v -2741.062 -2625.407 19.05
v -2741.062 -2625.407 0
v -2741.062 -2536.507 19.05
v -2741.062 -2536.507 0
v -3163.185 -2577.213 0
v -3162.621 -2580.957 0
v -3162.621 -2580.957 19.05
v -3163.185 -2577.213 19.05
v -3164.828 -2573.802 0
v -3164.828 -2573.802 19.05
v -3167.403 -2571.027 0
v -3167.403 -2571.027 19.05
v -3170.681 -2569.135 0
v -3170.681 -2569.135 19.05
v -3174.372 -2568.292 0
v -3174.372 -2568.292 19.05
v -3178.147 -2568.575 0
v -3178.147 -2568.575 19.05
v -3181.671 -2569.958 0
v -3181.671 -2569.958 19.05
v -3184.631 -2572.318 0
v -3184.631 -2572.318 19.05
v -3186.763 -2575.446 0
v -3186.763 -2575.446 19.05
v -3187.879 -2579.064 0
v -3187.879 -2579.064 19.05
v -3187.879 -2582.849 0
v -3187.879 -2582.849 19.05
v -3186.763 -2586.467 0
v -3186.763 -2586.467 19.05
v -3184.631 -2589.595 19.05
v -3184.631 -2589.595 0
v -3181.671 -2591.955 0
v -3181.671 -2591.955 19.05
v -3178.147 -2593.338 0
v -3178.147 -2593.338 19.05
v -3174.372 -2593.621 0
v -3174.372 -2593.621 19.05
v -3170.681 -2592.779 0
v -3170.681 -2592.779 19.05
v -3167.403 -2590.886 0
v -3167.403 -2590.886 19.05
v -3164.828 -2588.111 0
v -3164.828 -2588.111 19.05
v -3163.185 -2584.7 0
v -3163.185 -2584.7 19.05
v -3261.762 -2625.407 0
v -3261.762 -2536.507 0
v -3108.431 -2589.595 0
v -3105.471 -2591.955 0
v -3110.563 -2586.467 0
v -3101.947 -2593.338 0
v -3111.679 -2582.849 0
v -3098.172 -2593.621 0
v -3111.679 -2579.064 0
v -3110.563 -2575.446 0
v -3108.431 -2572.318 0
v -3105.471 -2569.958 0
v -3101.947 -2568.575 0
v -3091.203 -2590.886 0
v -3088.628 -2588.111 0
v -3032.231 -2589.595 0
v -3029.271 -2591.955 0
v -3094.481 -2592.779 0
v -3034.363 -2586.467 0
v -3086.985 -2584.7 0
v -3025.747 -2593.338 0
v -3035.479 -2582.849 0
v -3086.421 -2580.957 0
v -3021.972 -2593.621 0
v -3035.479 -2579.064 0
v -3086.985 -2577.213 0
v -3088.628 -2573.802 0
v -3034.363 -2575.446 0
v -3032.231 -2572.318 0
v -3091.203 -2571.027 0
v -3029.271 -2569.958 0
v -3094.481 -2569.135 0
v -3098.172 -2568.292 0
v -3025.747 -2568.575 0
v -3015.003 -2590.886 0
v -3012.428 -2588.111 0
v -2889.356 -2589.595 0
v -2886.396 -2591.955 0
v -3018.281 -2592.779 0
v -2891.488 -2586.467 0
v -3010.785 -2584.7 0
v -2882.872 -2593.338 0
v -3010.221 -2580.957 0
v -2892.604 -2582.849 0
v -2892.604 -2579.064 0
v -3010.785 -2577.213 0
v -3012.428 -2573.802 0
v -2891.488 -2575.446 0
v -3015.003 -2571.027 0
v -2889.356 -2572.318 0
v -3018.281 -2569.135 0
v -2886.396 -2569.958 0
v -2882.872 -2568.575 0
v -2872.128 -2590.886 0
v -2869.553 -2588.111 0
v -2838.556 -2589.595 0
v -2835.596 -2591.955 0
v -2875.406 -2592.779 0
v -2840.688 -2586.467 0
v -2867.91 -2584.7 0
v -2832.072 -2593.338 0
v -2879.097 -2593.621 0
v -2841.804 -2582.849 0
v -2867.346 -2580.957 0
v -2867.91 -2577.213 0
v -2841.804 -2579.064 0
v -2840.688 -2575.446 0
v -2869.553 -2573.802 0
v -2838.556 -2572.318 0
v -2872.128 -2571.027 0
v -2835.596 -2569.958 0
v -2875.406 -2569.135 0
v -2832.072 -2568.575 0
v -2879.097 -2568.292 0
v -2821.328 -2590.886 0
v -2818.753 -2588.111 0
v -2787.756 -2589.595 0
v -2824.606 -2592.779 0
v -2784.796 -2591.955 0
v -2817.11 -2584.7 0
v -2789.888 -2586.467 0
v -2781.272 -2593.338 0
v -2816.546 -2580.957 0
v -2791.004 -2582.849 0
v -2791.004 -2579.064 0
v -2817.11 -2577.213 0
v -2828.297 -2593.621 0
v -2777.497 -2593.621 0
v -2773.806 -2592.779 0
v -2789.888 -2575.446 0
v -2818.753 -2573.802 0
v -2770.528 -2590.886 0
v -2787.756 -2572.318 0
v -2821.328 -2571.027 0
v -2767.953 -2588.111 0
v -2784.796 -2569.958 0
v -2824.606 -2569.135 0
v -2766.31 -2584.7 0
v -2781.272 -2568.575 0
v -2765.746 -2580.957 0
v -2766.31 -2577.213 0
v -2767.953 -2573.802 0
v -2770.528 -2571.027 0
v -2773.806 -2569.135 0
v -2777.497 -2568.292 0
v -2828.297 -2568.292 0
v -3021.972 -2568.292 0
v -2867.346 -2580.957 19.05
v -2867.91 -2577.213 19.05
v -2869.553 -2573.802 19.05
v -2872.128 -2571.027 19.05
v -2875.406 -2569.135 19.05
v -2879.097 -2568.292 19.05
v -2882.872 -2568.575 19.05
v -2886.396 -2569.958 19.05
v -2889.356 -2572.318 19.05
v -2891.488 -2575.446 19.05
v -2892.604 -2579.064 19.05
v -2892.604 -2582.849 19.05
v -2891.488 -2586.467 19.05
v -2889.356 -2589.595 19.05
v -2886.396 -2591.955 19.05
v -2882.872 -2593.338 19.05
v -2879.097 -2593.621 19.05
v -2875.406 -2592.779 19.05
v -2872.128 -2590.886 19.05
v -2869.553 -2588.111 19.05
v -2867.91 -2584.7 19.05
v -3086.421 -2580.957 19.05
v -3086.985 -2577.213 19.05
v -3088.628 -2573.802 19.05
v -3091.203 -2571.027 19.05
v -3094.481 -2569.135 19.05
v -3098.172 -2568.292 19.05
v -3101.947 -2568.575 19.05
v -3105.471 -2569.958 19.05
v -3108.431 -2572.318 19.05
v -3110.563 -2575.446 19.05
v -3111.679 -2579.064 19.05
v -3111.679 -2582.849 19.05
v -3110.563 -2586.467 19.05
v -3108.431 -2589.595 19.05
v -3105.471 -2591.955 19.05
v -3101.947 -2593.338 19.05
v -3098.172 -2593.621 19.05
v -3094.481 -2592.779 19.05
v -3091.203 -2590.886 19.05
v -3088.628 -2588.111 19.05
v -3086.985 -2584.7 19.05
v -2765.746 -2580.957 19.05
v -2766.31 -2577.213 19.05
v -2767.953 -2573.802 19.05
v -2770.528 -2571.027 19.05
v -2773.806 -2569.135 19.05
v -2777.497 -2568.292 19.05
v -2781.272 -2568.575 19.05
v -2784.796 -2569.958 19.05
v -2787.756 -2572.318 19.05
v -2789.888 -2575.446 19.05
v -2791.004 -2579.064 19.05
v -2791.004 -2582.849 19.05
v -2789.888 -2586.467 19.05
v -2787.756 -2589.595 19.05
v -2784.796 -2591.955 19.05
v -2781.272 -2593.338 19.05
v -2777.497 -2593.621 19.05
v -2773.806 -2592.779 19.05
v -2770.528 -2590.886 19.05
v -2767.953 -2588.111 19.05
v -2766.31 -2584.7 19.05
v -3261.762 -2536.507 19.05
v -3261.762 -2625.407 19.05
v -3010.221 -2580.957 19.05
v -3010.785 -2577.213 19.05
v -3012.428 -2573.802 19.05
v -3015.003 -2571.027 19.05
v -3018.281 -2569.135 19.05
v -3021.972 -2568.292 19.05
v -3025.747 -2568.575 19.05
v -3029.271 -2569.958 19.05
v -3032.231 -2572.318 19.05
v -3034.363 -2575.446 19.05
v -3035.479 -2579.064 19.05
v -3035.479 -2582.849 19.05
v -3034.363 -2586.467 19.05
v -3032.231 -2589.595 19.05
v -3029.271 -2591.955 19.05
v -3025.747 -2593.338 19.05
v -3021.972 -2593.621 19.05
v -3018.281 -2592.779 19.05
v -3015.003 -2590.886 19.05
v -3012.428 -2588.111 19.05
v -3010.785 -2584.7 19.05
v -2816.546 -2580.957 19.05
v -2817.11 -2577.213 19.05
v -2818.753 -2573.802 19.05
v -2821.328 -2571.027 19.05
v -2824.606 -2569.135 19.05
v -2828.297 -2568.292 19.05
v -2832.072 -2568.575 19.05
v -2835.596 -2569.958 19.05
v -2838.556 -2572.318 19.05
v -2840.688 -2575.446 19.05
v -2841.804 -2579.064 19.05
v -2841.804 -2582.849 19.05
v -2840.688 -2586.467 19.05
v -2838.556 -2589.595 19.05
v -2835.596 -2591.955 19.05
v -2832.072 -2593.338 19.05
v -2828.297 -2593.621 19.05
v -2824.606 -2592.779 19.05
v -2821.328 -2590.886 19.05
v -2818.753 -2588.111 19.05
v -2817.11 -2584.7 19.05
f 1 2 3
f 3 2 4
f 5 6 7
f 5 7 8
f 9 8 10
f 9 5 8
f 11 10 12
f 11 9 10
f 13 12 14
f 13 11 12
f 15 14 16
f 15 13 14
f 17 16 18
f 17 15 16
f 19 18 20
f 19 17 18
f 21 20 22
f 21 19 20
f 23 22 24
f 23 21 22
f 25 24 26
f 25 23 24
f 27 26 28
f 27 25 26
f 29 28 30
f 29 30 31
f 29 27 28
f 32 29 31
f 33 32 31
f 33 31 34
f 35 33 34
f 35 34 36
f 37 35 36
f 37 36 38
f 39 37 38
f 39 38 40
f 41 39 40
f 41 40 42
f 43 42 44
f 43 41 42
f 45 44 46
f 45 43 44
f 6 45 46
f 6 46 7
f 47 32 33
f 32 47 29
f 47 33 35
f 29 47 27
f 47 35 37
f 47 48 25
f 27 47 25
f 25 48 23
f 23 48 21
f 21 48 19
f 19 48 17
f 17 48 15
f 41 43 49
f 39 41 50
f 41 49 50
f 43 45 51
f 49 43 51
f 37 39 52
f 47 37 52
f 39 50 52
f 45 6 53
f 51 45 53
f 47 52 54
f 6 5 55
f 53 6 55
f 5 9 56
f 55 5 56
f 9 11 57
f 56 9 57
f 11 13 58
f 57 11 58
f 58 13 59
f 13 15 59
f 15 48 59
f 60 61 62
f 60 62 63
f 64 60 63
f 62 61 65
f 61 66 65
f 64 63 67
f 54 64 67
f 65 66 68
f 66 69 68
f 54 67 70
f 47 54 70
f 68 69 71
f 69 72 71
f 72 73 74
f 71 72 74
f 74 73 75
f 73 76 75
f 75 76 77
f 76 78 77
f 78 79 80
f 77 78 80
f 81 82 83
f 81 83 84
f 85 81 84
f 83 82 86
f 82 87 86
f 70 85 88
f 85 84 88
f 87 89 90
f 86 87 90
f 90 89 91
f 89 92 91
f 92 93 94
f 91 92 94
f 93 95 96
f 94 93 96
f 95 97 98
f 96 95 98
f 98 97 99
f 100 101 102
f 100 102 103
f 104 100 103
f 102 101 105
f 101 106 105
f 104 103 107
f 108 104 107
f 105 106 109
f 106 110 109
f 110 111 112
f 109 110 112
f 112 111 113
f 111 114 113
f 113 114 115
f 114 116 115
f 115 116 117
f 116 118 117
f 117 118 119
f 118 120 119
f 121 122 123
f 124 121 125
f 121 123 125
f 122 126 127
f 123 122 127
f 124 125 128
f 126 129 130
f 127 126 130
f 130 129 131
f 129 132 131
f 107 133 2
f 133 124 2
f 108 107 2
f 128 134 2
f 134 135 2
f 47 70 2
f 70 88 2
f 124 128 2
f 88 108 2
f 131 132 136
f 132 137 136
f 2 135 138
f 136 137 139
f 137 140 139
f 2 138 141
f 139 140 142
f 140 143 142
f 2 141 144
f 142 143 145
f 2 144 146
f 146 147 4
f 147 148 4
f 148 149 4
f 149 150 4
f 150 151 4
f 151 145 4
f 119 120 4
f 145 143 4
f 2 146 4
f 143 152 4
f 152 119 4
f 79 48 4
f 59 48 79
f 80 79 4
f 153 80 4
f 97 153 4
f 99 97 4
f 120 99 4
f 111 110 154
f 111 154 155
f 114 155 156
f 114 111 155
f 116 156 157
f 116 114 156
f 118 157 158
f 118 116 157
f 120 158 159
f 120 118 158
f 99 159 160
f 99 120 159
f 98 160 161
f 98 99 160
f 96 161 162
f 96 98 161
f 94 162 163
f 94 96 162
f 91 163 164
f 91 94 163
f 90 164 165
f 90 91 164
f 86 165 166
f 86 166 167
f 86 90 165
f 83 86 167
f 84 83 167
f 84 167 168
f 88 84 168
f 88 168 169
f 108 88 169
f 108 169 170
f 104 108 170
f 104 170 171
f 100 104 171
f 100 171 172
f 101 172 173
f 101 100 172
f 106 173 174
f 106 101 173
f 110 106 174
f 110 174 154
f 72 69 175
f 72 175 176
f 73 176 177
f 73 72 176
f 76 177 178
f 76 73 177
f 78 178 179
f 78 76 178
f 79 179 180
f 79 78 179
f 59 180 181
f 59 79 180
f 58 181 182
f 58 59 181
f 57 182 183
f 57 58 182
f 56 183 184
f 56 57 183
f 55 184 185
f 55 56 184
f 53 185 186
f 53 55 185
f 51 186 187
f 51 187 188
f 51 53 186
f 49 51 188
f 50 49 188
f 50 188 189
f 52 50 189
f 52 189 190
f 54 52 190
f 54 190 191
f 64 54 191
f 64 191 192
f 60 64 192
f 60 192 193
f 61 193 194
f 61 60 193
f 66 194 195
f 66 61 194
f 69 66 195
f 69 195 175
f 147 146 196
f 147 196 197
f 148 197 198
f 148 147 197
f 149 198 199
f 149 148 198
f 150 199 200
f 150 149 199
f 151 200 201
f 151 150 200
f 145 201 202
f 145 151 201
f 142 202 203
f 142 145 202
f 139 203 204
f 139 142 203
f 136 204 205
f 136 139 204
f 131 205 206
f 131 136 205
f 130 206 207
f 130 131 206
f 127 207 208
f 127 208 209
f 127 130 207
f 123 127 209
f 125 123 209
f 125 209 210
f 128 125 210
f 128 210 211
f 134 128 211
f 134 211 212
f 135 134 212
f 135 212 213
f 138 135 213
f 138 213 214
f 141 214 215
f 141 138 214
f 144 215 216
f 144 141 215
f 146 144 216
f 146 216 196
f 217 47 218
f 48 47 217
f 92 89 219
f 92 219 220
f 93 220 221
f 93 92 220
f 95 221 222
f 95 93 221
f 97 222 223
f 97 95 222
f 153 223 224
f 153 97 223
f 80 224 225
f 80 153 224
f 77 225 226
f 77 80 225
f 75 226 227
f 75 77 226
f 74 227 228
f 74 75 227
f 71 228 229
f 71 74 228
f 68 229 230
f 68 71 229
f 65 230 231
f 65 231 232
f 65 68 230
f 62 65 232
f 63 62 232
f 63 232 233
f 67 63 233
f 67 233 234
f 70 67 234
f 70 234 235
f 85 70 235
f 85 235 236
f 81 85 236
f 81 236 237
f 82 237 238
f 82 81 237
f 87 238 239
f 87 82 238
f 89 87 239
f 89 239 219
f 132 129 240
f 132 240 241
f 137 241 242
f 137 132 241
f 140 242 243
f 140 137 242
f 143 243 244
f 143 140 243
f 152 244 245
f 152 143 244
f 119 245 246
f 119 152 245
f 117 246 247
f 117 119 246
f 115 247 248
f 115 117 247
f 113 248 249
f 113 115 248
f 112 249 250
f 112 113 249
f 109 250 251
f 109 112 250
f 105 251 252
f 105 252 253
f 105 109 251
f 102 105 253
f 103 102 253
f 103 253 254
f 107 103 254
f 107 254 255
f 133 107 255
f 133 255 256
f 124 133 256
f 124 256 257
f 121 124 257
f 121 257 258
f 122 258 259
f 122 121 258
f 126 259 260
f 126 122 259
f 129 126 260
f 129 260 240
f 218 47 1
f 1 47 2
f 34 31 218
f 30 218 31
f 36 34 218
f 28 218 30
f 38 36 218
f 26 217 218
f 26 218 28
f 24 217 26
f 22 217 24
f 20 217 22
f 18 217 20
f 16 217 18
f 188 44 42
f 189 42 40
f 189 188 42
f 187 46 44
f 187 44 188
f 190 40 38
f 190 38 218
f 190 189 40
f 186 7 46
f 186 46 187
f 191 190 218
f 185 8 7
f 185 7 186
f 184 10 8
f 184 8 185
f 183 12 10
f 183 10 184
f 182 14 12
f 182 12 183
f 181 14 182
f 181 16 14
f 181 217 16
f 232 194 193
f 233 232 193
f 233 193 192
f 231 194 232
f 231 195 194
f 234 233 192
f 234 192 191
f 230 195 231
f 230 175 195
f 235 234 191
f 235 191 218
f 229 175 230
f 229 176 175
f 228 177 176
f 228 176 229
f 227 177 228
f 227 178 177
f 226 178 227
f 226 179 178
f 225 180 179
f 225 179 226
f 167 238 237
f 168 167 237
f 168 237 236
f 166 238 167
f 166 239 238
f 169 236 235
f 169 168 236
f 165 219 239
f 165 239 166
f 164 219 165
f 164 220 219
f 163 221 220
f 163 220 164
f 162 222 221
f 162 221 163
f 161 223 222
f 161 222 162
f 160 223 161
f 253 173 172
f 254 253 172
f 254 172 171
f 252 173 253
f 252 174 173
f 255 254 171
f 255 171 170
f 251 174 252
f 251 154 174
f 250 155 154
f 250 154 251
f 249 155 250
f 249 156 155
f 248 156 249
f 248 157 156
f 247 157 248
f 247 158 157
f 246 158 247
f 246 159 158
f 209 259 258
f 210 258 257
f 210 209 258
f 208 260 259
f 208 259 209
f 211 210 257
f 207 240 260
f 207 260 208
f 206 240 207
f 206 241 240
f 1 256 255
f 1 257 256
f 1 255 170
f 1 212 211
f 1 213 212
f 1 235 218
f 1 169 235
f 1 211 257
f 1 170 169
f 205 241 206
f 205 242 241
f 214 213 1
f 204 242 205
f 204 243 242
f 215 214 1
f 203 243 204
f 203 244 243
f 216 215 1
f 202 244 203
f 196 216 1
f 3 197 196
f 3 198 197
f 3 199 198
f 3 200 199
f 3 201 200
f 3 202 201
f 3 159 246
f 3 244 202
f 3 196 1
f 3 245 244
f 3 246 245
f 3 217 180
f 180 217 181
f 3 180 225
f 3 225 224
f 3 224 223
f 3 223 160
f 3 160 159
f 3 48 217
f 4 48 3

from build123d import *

# Parameters (mm, degrees)
F0_W     = 520.7
F0_H     = 88.9
F0_R     = 12.7
F1_DEPTH = 19.05


with BuildPart() as f1:
    # F0 (on Top) → F1 (new body)
    with BuildSketch(Plane.XY):
        with Locations((-3001.411803, -2580.956636)):
            Rectangle(F0_W, F0_H)
        with Locations((-3175.321132, -2580.956636)):
            Circle(F0_R, mode=Mode.SUBTRACT)
        with Locations((-3099.121132, -2580.956636)):
            Circle(F0_R, mode=Mode.SUBTRACT)
        with Locations((-3022.921132, -2580.956636)):
            Circle(F0_R, mode=Mode.SUBTRACT)
        with Locations((-2880.046132, -2580.956636)):
            Circle(F0_R, mode=Mode.SUBTRACT)
        with Locations((-2829.246132, -2580.956636)):
            Circle(F0_R, mode=Mode.SUBTRACT)
        with Locations((-2778.446132, -2580.956636)):
            Circle(F0_R, mode=Mode.SUBTRACT)
    extrude(amount=F1_DEPTH)


solid = f1.part
